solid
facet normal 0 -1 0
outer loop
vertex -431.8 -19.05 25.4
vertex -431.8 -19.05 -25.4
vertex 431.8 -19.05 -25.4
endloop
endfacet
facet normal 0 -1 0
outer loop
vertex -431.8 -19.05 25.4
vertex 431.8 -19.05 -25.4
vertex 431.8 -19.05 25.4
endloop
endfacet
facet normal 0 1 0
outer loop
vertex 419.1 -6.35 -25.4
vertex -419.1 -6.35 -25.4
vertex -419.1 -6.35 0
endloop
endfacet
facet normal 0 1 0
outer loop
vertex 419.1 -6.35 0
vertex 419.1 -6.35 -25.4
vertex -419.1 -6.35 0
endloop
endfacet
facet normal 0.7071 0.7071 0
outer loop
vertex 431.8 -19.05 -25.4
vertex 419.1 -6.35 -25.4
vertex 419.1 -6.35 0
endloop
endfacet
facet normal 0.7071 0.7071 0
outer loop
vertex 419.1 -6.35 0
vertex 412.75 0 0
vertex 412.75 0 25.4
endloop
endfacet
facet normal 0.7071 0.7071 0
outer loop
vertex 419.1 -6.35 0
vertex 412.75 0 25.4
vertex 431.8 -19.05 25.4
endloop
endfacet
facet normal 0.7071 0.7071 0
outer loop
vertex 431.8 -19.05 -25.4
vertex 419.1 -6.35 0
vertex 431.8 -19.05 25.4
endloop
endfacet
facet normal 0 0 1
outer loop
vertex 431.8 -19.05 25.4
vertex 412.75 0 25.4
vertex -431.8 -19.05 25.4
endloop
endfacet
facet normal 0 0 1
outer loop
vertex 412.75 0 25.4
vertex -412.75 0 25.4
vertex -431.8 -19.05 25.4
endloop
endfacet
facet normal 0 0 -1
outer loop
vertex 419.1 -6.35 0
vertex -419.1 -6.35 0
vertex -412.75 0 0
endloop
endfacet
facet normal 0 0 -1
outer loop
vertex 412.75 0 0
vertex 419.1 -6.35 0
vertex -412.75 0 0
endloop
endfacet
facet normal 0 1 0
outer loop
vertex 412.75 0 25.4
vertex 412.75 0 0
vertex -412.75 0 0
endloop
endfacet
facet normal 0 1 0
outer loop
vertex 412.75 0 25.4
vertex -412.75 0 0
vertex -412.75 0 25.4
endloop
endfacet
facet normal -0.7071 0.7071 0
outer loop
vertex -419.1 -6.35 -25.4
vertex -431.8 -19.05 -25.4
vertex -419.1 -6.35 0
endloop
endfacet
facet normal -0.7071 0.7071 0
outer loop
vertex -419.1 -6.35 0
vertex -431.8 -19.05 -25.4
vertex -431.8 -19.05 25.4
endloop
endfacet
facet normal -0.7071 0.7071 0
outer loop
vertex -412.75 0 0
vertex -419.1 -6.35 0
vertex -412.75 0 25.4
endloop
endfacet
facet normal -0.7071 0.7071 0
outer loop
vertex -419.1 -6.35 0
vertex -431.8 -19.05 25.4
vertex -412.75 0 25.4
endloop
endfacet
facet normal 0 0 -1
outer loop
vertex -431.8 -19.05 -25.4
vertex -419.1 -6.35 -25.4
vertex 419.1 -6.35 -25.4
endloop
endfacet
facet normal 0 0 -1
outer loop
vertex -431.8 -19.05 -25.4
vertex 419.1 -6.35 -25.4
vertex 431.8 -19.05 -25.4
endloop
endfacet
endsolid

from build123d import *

# Parameters (mm, degrees)
F0_W     = 762
F0_H     = 50.8
F1_DEPTH = 19.05
F3_DEPTH = 762.001
F4_DEPTH = 50.8
F5_DEPTH = 50.8
F7_DEPTH = 50.801


with BuildPart() as f1:
    # F0 (on Front) → F1 (new body)
    with BuildSketch(Plane.XZ):
        Rectangle(F0_W, F0_H)
    extrude(amount=F1_DEPTH)

    # F2 (on face) → F3 (cut, through all)
    with BuildSketch(Plane(origin=(-381, 0, 0), x_dir=(0, -1, 0), z_dir=(-1, 0, 0))):
        Polygon((6.35, -29.9884248525), (6.35, -25.4), (6.35, 0), (0, 0), (-13.0046028644, 0), (-13.0046028644, -29.9884248525), align=None)
    extrude(amount=-F3_DEPTH, mode=Mode.SUBTRACT)

    # F4 (add): a face of the model
    f4_faces = [f1.faces().sort_by_distance(p)[0] for p in [
        (-381, -10.795, 2.54),
    ]]
    extrude(f4_faces, amount=F4_DEPTH)

    # F5 (add): a face of the model
    f5_faces = [f1.faces().sort_by_distance(p)[0] for p in [
        (381, -10.795, 2.54),
    ]]
    extrude(f5_faces, amount=F5_DEPTH)

    # F6 (on face) → F7 (cut, through all)
    with BuildSketch(Plane.XY.offset(25.4)):
        Polygon((412.75, 0), (431.8, -19.05), (436.4477694035, -19.05), (436.4477694035, 9.3147736043), (412.75, 9.3147736043), align=None)
        Polygon((-444.389373064, -19.05), (-431.8, -19.05), (-412.75, 0), (-412.75, 9.4755124301), (-444.389373064, 9.4755124301), align=None)
    extrude(amount=-F7_DEPTH, mode=Mode.SUBTRACT)


solid = f1.part
